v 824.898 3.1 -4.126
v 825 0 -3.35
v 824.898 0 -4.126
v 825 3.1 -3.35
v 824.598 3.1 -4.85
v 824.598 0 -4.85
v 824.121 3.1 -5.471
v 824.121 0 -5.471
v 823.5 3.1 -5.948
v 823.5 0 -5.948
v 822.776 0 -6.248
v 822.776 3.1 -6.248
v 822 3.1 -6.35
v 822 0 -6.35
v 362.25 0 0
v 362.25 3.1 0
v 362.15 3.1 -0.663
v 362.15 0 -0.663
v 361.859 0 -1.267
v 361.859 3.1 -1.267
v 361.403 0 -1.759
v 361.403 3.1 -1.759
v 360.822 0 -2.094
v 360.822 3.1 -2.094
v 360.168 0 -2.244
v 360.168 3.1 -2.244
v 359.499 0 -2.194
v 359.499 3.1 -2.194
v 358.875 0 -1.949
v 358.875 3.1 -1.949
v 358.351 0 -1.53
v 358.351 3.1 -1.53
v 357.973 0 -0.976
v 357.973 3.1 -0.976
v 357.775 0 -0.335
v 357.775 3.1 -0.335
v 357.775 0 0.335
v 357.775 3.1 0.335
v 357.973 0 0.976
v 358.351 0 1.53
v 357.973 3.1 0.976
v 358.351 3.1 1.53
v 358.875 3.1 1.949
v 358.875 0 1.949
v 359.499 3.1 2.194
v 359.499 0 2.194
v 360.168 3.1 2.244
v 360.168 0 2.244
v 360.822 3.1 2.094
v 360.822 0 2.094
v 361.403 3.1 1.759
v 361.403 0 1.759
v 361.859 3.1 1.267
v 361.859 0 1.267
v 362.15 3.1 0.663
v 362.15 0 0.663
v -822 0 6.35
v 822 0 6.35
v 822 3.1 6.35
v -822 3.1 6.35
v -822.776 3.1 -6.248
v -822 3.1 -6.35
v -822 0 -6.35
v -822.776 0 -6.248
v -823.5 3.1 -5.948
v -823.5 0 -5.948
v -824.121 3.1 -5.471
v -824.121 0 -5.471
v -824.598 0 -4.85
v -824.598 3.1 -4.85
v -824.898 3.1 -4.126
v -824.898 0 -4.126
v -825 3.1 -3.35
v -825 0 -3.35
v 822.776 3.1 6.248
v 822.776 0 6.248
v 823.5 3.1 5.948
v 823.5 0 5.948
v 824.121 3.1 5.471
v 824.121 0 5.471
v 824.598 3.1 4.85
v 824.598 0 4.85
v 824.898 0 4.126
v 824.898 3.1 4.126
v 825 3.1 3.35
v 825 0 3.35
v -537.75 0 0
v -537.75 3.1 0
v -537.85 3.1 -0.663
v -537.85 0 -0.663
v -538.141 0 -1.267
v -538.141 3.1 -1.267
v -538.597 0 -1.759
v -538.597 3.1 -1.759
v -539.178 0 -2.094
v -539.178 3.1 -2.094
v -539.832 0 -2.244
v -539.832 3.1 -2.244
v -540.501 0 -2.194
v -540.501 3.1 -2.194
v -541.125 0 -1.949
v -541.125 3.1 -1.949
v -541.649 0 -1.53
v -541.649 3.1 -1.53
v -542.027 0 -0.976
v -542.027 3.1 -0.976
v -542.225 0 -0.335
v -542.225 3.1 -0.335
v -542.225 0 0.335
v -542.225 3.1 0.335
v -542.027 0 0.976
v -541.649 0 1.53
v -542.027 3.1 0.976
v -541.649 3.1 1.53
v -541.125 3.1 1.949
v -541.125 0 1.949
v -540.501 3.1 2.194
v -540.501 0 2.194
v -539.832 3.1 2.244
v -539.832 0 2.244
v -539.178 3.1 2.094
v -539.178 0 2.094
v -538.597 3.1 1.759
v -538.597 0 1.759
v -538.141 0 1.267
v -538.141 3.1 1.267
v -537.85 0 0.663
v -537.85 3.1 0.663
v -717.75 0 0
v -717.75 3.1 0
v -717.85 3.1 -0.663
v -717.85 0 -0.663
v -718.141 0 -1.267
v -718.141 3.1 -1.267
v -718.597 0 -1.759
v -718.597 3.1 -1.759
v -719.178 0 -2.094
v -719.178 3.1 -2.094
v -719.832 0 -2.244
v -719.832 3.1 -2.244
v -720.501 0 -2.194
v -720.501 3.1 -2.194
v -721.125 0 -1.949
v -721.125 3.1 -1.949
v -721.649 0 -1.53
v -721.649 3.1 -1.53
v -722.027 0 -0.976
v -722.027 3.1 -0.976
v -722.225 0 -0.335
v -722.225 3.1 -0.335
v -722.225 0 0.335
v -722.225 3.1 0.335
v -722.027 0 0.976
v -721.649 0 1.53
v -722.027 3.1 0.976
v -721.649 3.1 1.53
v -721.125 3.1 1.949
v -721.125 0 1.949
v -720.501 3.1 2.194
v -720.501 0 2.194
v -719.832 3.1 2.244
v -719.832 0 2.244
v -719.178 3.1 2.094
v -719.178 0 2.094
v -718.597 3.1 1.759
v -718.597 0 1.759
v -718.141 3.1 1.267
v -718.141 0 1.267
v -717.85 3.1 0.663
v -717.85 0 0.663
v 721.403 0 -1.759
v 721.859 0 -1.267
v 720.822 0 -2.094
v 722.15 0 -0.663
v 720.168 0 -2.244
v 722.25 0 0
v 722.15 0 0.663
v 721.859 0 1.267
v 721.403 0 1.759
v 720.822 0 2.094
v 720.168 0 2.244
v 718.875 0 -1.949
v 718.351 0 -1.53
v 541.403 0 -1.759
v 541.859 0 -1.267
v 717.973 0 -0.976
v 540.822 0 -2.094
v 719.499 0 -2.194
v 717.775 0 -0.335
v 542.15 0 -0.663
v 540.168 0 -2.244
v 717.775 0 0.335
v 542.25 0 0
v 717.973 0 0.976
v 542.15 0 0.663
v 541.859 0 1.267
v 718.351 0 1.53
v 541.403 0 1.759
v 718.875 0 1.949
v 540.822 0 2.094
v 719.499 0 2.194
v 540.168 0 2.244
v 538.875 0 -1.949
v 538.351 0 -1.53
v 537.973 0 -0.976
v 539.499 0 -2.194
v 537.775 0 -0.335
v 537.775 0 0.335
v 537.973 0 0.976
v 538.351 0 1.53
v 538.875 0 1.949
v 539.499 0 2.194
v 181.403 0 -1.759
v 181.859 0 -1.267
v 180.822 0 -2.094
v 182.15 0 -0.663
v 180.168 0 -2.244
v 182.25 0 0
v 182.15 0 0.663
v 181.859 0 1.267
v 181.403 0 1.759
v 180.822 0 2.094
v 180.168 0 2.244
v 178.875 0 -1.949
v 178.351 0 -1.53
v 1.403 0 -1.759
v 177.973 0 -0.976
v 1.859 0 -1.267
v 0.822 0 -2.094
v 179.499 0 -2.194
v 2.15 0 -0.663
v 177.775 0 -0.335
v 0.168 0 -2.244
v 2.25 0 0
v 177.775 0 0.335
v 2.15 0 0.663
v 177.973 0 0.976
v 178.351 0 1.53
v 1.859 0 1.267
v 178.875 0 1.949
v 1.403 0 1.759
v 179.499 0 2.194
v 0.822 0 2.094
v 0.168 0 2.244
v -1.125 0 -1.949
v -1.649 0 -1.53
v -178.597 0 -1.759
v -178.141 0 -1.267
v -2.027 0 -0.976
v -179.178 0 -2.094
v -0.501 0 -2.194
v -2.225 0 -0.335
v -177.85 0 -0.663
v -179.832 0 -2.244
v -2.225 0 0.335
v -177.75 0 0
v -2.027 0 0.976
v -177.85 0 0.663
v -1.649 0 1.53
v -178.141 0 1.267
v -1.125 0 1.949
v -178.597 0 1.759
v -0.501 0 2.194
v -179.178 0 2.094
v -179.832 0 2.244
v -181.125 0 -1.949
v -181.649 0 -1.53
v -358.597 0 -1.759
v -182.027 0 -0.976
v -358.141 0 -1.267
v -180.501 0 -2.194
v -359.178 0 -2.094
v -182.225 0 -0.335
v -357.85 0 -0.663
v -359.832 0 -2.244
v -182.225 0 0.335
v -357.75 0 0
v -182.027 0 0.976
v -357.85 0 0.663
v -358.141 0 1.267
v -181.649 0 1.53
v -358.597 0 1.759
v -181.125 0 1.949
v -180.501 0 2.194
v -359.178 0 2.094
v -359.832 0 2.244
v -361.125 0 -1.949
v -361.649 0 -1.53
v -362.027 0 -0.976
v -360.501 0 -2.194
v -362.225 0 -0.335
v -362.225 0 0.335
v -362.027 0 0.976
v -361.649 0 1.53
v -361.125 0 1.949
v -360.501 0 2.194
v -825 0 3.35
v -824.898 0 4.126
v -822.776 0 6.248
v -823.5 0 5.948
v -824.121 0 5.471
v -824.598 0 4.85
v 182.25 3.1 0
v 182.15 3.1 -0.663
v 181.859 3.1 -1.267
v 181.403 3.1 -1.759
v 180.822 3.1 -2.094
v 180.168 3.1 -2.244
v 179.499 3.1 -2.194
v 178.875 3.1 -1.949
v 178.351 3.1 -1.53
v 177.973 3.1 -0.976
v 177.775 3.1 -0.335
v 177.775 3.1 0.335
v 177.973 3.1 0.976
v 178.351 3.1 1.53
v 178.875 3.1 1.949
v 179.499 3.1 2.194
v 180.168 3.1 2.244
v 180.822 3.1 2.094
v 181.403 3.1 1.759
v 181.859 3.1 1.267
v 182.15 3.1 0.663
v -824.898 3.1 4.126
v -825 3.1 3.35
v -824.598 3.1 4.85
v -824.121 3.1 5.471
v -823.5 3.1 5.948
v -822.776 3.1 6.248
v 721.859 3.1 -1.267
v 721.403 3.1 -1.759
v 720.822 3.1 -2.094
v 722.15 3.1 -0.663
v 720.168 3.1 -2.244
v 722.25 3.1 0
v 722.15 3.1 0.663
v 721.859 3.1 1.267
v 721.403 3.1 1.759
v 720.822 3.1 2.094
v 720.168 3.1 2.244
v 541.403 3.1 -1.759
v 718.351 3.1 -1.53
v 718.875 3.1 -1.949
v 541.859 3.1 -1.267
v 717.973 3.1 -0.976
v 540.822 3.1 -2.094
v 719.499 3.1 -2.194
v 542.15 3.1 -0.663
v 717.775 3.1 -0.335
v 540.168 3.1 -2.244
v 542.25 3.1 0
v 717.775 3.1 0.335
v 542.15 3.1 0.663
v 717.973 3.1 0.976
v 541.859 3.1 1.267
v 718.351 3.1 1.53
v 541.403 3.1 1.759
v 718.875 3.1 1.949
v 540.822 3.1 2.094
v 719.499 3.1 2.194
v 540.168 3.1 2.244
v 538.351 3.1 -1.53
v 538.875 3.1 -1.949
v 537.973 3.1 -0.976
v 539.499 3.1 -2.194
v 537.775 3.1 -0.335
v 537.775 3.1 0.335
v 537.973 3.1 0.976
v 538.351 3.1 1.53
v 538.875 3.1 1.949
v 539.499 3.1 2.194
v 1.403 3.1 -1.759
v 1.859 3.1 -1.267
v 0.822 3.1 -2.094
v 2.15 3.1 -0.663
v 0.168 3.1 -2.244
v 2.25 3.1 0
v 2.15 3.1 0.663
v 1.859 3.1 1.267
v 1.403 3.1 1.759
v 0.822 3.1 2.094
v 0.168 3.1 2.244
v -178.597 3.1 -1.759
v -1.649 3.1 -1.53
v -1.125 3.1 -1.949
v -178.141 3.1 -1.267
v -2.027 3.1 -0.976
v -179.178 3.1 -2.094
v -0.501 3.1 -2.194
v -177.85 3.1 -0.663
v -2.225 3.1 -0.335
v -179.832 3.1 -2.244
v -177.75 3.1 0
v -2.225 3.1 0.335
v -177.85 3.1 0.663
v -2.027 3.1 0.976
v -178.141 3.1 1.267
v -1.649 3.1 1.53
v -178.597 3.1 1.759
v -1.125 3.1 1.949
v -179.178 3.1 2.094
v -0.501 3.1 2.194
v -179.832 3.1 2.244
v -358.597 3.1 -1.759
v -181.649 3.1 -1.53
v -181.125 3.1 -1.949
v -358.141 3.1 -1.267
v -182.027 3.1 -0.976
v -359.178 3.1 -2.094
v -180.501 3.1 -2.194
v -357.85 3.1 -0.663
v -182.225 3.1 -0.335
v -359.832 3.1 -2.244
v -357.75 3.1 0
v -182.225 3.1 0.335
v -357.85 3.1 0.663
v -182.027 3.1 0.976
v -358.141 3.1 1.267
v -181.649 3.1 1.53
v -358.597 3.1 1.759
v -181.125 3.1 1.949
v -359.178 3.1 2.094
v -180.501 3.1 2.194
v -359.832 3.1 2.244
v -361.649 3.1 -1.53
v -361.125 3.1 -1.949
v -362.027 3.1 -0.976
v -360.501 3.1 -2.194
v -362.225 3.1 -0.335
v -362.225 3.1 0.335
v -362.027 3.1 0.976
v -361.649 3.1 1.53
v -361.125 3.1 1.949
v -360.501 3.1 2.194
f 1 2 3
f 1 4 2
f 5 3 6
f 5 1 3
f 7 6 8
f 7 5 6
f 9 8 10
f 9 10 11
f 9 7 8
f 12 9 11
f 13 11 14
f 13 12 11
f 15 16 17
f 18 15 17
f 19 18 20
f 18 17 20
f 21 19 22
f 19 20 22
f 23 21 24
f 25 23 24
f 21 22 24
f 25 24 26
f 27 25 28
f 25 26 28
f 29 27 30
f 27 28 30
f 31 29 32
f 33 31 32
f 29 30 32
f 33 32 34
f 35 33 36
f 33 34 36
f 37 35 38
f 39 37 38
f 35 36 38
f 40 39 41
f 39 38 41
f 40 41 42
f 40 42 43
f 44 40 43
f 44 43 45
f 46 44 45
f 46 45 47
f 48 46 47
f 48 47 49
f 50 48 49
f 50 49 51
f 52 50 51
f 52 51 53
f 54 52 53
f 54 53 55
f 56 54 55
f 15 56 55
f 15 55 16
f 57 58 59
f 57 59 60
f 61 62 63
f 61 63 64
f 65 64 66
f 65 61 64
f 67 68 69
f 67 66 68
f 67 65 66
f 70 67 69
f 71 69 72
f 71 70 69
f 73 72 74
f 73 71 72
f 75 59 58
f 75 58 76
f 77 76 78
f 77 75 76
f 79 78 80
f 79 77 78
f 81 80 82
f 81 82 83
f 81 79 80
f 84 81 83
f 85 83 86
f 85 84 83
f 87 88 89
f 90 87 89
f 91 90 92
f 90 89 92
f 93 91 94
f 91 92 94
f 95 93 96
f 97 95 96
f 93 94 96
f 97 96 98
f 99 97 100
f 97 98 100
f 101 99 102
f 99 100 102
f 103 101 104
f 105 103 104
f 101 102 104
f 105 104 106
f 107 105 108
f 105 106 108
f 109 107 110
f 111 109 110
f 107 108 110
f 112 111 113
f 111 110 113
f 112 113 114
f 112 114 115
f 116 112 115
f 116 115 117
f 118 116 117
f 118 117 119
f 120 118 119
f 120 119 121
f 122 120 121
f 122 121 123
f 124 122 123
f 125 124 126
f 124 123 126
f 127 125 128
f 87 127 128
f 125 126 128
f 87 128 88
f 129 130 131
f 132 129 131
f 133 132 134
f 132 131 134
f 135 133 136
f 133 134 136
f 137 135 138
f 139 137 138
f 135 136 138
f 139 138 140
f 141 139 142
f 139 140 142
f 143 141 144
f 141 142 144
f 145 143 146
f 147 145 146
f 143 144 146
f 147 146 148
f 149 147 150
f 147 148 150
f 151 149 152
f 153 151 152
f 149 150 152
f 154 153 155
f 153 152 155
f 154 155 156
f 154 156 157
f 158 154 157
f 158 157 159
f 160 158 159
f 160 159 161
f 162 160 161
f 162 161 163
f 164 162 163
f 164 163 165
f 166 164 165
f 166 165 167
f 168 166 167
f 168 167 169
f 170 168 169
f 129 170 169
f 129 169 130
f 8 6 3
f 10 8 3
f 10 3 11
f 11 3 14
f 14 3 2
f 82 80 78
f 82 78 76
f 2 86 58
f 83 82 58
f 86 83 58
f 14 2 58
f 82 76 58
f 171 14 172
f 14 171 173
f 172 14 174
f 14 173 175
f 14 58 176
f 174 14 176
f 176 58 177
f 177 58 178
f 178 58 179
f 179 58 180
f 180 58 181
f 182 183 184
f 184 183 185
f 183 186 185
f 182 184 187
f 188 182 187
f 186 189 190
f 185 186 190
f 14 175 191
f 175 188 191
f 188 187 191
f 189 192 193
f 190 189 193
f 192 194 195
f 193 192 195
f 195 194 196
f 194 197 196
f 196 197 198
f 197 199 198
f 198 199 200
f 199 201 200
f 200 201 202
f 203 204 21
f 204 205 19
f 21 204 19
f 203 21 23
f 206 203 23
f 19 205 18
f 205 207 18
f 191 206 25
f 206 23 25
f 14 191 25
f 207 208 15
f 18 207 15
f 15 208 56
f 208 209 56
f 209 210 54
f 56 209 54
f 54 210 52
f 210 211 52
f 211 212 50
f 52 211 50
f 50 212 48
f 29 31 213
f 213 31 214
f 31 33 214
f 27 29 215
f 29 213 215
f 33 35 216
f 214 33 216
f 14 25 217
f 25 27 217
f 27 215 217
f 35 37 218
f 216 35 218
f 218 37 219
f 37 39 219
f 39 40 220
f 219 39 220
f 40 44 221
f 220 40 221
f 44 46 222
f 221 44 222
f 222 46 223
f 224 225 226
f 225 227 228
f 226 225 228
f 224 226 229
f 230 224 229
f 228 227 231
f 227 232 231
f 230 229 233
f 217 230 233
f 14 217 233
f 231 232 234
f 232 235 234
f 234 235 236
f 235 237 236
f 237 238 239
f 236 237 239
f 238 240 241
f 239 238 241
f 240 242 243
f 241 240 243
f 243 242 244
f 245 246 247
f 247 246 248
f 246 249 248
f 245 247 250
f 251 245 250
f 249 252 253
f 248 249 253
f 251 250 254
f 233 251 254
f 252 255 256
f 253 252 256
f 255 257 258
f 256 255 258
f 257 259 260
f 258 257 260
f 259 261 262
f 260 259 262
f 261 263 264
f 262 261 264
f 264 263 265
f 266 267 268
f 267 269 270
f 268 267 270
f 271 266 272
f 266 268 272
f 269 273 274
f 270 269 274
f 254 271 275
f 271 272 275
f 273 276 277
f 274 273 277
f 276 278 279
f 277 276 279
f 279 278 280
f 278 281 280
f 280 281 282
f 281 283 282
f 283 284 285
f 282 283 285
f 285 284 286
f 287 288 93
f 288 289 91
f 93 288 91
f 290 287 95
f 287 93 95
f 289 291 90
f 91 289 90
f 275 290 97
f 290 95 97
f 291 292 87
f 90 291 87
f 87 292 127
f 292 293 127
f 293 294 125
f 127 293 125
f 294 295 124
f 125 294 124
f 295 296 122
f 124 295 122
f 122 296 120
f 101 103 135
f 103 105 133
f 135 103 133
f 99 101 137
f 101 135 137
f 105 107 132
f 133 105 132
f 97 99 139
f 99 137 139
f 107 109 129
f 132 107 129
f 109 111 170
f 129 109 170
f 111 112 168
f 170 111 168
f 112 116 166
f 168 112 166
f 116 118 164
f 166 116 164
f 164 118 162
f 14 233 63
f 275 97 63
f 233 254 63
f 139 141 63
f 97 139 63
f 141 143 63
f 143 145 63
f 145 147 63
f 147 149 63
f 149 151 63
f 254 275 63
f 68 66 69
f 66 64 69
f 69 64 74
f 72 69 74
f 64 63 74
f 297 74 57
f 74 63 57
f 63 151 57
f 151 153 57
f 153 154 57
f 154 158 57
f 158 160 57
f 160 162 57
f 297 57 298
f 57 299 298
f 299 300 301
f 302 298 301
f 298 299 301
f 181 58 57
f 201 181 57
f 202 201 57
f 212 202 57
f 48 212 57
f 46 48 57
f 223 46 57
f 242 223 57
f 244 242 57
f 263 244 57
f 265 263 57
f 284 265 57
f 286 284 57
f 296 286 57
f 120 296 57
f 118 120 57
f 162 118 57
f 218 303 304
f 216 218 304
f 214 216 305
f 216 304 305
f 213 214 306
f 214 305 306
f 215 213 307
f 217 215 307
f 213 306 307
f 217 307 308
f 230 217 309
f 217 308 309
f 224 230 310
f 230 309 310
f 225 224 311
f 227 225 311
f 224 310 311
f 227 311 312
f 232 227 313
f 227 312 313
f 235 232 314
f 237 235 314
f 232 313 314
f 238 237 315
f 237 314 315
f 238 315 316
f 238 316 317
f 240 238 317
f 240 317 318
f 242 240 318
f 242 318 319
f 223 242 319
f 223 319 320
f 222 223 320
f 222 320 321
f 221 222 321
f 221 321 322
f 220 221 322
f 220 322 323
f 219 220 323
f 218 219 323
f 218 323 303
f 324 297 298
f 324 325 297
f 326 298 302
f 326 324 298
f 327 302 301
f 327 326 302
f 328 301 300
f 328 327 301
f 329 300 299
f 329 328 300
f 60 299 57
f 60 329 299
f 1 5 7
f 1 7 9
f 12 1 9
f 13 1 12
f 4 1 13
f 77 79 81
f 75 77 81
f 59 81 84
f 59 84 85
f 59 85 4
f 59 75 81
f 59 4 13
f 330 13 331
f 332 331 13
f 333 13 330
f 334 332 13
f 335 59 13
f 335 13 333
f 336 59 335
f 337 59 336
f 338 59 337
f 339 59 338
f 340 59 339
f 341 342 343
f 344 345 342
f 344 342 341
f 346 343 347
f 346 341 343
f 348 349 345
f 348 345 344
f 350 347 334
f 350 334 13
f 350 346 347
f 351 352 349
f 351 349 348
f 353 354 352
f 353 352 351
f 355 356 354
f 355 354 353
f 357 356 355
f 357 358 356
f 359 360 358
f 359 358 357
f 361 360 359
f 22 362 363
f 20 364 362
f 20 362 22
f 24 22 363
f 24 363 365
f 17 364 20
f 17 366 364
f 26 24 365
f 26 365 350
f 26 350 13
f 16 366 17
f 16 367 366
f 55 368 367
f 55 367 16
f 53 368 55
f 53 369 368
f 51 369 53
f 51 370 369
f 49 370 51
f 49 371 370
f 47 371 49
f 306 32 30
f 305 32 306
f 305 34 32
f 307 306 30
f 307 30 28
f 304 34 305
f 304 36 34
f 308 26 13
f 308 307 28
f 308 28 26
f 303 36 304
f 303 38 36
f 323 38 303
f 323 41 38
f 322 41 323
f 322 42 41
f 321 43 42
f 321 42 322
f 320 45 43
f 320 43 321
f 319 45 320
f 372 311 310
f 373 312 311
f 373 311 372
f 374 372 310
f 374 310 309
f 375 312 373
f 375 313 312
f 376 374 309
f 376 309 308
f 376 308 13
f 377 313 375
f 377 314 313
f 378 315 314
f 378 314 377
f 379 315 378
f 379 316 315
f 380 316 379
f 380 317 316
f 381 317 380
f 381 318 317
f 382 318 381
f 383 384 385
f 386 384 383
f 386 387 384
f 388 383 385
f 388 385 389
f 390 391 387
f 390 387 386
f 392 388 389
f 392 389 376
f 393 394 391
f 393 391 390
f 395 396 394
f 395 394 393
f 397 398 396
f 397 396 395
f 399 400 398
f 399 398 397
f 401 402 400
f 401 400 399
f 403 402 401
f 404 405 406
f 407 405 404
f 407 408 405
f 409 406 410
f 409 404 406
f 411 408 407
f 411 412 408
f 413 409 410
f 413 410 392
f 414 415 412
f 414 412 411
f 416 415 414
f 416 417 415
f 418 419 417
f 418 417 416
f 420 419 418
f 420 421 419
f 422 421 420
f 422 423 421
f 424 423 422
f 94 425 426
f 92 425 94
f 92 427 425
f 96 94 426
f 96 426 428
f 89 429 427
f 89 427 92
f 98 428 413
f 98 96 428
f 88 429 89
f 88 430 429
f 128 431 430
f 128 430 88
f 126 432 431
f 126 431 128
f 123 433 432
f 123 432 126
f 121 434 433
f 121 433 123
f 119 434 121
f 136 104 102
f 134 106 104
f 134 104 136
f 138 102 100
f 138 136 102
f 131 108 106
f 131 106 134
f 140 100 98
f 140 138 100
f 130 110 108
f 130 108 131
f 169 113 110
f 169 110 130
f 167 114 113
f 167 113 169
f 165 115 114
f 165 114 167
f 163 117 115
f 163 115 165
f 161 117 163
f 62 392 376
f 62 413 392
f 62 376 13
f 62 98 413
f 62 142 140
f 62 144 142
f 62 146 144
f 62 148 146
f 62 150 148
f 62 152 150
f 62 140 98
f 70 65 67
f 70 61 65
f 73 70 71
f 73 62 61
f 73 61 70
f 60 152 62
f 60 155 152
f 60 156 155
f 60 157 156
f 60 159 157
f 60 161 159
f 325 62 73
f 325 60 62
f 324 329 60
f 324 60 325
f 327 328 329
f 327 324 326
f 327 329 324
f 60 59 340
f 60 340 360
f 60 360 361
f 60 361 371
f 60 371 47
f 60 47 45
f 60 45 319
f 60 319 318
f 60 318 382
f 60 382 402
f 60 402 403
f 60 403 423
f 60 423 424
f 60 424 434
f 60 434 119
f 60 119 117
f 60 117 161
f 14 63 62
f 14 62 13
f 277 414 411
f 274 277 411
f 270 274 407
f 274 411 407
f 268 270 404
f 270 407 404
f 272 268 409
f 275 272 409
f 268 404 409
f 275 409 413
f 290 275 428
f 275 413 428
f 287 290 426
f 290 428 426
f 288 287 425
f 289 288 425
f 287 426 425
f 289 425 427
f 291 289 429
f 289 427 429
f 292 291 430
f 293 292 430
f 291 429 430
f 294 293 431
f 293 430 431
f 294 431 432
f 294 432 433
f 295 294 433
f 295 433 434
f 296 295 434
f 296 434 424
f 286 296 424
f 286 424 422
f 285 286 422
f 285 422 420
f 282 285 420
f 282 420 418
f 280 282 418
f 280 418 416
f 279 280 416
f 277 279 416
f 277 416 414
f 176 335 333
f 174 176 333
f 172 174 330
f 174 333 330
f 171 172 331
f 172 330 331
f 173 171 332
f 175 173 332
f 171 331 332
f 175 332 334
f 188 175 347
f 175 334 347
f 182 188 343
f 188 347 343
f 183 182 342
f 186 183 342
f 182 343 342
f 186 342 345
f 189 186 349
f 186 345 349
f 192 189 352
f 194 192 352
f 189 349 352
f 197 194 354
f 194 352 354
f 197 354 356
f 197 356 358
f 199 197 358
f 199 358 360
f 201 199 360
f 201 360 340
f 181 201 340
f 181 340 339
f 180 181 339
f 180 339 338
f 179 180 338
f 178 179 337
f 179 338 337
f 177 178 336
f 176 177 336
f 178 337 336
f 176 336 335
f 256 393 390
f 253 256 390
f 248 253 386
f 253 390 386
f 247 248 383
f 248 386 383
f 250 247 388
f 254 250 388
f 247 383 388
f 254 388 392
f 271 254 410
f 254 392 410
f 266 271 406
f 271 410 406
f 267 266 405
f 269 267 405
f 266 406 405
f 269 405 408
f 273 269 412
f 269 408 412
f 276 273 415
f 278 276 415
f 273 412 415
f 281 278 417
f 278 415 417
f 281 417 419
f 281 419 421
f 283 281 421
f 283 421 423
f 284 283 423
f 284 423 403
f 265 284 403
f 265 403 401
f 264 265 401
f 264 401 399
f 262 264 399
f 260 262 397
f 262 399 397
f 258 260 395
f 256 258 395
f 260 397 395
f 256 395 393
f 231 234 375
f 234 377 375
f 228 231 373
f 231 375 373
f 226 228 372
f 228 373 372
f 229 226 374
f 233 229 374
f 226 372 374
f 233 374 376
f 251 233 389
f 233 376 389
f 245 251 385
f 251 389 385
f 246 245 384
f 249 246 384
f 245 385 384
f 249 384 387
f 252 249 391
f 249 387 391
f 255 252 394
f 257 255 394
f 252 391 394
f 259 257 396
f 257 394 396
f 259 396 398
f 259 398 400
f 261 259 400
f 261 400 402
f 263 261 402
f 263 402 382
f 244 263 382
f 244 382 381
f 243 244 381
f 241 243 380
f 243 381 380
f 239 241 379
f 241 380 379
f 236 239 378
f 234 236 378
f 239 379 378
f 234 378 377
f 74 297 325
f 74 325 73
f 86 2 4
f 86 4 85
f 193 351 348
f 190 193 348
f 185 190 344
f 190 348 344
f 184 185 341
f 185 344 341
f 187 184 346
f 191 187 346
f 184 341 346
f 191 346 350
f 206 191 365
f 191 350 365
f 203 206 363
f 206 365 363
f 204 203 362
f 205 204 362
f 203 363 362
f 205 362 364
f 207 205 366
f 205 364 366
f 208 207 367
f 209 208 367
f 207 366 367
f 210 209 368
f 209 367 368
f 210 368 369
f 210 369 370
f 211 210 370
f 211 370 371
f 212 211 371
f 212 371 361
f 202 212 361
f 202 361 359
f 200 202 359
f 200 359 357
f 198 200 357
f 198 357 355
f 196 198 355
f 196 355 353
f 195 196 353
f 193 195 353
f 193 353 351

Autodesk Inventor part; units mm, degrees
ref_plane "YZ Plane" through (0, 0, 0) normal (1, 0, 0) x (0, 1, 0)
ref_plane "XZ Plane" through (0, 0, 0) normal (0, 1, 0) x (-1, 0, 0)
ref_plane "XY Plane" through (0, 0, 0) normal (0, 0, 1) x (1, 0, 0)
sketch "Sketch1" plane through (0, 0, 0) normal (0, 1, 0) x (-1, 0, 0)
  line L0 (-825, 6.35) -> (825, 6.35)
  line L1 (825, 6.35) -> (825, -6.35)
  line L2 (825, -6.35) -> (-825, -6.35)
  line L3 (-825, -6.35) -> (-825, 6.35)
  line L4 (-825, 6.35) -> (825, -6.35) construction
  line L5 (825, 6.35) -> (-825, -6.35) construction
  point P0 (0, 0)
  dimension "d0" = 1650
  dimension "d1" = 12.7
extrude "Extrusion1" add sketch "Sketch1" along normal blind 3.1
sketch "Sketch2" plane through (0, 3.1, 0) normal (0, 1, 0) x (1, 0, 0)
  circle A0 centre (0, 0) radius 2.25
  dimension "d4" = 4.5
extrude "Extrusion2" cut sketch "Sketch2" against normal blind 3.1
sketch "Sketch4" plane through (0, 3.1, 0) normal (0, 1, 0) x (1, 0, 0)
  line L0 (-825, -6.35) -> (825, -6.35) projected
  line L1 (825, 6.35) -> (-825, 6.35) projected
  line L2 (-825, -6.35) -> (825, -6.35)
  line L3 (825, -6.35) -> (825, 6.35)
  line L4 (825, 6.35) -> (-825, 6.35)
  line L5 (-825, 6.35) -> (-825, -6.35)
  circle A0 centre (0, 0) radius 2.25
  circle A1 centre (180, 0) radius 2.25
  circle A2 centre (360, 0) radius 2.25
  circle A3 centre (540, 0) radius 2.25
  circle A4 centre (720, 0) radius 2.25
  circle A5 centre (-180, 0) radius 2.25
  circle A6 centre (0, 0) radius 2.25
  circle A7 centre (180, 0) radius 2.25
  circle A8 centre (360, 0) radius 2.25
  circle A9 centre (540, 0) radius 2.25
  circle A10 centre (-360, 0) radius 2.25
  circle A11 centre (-180, 0) radius 2.25
  circle A12 centre (0, 0) radius 2.25
  circle A13 centre (180, 0) radius 2.25
  circle A14 centre (360, 0) radius 2.25
  circle A15 centre (-540, 0) radius 2.25
  circle A16 centre (-360, 0) radius 2.25
  circle A17 centre (-180, 0) radius 2.25
  circle A18 centre (0, 0) radius 2.25
  circle A19 centre (180, 0) radius 2.25
  circle A20 centre (-720, 0) radius 2.25
  circle A21 centre (-540, 0) radius 2.25
  circle A22 centre (-360, 0) radius 2.25
  circle A23 centre (-180, 0) radius 2.25
  circle A24 centre (0, 0) radius 2.25
  dimension "d9" = 180
  dimension "d12" = 180
extrude "Extrusion3" cut sketch "Sketch4" against normal blind 180 contours A0 | A1 | A2 | A3 | A4 | A5 | A10 | A15 | A20
fillet "Fillet1" radius 3 4 edges at (825, 1.55, 6.35) (825, 1.55, -6.35) (-825, 1.55, -6.35) (-825, 1.55, 6.35)
equation "\"d15\" = d9"
properties part number "SP28V1 Seguro Acrilico" material "Steel, Carbon"
